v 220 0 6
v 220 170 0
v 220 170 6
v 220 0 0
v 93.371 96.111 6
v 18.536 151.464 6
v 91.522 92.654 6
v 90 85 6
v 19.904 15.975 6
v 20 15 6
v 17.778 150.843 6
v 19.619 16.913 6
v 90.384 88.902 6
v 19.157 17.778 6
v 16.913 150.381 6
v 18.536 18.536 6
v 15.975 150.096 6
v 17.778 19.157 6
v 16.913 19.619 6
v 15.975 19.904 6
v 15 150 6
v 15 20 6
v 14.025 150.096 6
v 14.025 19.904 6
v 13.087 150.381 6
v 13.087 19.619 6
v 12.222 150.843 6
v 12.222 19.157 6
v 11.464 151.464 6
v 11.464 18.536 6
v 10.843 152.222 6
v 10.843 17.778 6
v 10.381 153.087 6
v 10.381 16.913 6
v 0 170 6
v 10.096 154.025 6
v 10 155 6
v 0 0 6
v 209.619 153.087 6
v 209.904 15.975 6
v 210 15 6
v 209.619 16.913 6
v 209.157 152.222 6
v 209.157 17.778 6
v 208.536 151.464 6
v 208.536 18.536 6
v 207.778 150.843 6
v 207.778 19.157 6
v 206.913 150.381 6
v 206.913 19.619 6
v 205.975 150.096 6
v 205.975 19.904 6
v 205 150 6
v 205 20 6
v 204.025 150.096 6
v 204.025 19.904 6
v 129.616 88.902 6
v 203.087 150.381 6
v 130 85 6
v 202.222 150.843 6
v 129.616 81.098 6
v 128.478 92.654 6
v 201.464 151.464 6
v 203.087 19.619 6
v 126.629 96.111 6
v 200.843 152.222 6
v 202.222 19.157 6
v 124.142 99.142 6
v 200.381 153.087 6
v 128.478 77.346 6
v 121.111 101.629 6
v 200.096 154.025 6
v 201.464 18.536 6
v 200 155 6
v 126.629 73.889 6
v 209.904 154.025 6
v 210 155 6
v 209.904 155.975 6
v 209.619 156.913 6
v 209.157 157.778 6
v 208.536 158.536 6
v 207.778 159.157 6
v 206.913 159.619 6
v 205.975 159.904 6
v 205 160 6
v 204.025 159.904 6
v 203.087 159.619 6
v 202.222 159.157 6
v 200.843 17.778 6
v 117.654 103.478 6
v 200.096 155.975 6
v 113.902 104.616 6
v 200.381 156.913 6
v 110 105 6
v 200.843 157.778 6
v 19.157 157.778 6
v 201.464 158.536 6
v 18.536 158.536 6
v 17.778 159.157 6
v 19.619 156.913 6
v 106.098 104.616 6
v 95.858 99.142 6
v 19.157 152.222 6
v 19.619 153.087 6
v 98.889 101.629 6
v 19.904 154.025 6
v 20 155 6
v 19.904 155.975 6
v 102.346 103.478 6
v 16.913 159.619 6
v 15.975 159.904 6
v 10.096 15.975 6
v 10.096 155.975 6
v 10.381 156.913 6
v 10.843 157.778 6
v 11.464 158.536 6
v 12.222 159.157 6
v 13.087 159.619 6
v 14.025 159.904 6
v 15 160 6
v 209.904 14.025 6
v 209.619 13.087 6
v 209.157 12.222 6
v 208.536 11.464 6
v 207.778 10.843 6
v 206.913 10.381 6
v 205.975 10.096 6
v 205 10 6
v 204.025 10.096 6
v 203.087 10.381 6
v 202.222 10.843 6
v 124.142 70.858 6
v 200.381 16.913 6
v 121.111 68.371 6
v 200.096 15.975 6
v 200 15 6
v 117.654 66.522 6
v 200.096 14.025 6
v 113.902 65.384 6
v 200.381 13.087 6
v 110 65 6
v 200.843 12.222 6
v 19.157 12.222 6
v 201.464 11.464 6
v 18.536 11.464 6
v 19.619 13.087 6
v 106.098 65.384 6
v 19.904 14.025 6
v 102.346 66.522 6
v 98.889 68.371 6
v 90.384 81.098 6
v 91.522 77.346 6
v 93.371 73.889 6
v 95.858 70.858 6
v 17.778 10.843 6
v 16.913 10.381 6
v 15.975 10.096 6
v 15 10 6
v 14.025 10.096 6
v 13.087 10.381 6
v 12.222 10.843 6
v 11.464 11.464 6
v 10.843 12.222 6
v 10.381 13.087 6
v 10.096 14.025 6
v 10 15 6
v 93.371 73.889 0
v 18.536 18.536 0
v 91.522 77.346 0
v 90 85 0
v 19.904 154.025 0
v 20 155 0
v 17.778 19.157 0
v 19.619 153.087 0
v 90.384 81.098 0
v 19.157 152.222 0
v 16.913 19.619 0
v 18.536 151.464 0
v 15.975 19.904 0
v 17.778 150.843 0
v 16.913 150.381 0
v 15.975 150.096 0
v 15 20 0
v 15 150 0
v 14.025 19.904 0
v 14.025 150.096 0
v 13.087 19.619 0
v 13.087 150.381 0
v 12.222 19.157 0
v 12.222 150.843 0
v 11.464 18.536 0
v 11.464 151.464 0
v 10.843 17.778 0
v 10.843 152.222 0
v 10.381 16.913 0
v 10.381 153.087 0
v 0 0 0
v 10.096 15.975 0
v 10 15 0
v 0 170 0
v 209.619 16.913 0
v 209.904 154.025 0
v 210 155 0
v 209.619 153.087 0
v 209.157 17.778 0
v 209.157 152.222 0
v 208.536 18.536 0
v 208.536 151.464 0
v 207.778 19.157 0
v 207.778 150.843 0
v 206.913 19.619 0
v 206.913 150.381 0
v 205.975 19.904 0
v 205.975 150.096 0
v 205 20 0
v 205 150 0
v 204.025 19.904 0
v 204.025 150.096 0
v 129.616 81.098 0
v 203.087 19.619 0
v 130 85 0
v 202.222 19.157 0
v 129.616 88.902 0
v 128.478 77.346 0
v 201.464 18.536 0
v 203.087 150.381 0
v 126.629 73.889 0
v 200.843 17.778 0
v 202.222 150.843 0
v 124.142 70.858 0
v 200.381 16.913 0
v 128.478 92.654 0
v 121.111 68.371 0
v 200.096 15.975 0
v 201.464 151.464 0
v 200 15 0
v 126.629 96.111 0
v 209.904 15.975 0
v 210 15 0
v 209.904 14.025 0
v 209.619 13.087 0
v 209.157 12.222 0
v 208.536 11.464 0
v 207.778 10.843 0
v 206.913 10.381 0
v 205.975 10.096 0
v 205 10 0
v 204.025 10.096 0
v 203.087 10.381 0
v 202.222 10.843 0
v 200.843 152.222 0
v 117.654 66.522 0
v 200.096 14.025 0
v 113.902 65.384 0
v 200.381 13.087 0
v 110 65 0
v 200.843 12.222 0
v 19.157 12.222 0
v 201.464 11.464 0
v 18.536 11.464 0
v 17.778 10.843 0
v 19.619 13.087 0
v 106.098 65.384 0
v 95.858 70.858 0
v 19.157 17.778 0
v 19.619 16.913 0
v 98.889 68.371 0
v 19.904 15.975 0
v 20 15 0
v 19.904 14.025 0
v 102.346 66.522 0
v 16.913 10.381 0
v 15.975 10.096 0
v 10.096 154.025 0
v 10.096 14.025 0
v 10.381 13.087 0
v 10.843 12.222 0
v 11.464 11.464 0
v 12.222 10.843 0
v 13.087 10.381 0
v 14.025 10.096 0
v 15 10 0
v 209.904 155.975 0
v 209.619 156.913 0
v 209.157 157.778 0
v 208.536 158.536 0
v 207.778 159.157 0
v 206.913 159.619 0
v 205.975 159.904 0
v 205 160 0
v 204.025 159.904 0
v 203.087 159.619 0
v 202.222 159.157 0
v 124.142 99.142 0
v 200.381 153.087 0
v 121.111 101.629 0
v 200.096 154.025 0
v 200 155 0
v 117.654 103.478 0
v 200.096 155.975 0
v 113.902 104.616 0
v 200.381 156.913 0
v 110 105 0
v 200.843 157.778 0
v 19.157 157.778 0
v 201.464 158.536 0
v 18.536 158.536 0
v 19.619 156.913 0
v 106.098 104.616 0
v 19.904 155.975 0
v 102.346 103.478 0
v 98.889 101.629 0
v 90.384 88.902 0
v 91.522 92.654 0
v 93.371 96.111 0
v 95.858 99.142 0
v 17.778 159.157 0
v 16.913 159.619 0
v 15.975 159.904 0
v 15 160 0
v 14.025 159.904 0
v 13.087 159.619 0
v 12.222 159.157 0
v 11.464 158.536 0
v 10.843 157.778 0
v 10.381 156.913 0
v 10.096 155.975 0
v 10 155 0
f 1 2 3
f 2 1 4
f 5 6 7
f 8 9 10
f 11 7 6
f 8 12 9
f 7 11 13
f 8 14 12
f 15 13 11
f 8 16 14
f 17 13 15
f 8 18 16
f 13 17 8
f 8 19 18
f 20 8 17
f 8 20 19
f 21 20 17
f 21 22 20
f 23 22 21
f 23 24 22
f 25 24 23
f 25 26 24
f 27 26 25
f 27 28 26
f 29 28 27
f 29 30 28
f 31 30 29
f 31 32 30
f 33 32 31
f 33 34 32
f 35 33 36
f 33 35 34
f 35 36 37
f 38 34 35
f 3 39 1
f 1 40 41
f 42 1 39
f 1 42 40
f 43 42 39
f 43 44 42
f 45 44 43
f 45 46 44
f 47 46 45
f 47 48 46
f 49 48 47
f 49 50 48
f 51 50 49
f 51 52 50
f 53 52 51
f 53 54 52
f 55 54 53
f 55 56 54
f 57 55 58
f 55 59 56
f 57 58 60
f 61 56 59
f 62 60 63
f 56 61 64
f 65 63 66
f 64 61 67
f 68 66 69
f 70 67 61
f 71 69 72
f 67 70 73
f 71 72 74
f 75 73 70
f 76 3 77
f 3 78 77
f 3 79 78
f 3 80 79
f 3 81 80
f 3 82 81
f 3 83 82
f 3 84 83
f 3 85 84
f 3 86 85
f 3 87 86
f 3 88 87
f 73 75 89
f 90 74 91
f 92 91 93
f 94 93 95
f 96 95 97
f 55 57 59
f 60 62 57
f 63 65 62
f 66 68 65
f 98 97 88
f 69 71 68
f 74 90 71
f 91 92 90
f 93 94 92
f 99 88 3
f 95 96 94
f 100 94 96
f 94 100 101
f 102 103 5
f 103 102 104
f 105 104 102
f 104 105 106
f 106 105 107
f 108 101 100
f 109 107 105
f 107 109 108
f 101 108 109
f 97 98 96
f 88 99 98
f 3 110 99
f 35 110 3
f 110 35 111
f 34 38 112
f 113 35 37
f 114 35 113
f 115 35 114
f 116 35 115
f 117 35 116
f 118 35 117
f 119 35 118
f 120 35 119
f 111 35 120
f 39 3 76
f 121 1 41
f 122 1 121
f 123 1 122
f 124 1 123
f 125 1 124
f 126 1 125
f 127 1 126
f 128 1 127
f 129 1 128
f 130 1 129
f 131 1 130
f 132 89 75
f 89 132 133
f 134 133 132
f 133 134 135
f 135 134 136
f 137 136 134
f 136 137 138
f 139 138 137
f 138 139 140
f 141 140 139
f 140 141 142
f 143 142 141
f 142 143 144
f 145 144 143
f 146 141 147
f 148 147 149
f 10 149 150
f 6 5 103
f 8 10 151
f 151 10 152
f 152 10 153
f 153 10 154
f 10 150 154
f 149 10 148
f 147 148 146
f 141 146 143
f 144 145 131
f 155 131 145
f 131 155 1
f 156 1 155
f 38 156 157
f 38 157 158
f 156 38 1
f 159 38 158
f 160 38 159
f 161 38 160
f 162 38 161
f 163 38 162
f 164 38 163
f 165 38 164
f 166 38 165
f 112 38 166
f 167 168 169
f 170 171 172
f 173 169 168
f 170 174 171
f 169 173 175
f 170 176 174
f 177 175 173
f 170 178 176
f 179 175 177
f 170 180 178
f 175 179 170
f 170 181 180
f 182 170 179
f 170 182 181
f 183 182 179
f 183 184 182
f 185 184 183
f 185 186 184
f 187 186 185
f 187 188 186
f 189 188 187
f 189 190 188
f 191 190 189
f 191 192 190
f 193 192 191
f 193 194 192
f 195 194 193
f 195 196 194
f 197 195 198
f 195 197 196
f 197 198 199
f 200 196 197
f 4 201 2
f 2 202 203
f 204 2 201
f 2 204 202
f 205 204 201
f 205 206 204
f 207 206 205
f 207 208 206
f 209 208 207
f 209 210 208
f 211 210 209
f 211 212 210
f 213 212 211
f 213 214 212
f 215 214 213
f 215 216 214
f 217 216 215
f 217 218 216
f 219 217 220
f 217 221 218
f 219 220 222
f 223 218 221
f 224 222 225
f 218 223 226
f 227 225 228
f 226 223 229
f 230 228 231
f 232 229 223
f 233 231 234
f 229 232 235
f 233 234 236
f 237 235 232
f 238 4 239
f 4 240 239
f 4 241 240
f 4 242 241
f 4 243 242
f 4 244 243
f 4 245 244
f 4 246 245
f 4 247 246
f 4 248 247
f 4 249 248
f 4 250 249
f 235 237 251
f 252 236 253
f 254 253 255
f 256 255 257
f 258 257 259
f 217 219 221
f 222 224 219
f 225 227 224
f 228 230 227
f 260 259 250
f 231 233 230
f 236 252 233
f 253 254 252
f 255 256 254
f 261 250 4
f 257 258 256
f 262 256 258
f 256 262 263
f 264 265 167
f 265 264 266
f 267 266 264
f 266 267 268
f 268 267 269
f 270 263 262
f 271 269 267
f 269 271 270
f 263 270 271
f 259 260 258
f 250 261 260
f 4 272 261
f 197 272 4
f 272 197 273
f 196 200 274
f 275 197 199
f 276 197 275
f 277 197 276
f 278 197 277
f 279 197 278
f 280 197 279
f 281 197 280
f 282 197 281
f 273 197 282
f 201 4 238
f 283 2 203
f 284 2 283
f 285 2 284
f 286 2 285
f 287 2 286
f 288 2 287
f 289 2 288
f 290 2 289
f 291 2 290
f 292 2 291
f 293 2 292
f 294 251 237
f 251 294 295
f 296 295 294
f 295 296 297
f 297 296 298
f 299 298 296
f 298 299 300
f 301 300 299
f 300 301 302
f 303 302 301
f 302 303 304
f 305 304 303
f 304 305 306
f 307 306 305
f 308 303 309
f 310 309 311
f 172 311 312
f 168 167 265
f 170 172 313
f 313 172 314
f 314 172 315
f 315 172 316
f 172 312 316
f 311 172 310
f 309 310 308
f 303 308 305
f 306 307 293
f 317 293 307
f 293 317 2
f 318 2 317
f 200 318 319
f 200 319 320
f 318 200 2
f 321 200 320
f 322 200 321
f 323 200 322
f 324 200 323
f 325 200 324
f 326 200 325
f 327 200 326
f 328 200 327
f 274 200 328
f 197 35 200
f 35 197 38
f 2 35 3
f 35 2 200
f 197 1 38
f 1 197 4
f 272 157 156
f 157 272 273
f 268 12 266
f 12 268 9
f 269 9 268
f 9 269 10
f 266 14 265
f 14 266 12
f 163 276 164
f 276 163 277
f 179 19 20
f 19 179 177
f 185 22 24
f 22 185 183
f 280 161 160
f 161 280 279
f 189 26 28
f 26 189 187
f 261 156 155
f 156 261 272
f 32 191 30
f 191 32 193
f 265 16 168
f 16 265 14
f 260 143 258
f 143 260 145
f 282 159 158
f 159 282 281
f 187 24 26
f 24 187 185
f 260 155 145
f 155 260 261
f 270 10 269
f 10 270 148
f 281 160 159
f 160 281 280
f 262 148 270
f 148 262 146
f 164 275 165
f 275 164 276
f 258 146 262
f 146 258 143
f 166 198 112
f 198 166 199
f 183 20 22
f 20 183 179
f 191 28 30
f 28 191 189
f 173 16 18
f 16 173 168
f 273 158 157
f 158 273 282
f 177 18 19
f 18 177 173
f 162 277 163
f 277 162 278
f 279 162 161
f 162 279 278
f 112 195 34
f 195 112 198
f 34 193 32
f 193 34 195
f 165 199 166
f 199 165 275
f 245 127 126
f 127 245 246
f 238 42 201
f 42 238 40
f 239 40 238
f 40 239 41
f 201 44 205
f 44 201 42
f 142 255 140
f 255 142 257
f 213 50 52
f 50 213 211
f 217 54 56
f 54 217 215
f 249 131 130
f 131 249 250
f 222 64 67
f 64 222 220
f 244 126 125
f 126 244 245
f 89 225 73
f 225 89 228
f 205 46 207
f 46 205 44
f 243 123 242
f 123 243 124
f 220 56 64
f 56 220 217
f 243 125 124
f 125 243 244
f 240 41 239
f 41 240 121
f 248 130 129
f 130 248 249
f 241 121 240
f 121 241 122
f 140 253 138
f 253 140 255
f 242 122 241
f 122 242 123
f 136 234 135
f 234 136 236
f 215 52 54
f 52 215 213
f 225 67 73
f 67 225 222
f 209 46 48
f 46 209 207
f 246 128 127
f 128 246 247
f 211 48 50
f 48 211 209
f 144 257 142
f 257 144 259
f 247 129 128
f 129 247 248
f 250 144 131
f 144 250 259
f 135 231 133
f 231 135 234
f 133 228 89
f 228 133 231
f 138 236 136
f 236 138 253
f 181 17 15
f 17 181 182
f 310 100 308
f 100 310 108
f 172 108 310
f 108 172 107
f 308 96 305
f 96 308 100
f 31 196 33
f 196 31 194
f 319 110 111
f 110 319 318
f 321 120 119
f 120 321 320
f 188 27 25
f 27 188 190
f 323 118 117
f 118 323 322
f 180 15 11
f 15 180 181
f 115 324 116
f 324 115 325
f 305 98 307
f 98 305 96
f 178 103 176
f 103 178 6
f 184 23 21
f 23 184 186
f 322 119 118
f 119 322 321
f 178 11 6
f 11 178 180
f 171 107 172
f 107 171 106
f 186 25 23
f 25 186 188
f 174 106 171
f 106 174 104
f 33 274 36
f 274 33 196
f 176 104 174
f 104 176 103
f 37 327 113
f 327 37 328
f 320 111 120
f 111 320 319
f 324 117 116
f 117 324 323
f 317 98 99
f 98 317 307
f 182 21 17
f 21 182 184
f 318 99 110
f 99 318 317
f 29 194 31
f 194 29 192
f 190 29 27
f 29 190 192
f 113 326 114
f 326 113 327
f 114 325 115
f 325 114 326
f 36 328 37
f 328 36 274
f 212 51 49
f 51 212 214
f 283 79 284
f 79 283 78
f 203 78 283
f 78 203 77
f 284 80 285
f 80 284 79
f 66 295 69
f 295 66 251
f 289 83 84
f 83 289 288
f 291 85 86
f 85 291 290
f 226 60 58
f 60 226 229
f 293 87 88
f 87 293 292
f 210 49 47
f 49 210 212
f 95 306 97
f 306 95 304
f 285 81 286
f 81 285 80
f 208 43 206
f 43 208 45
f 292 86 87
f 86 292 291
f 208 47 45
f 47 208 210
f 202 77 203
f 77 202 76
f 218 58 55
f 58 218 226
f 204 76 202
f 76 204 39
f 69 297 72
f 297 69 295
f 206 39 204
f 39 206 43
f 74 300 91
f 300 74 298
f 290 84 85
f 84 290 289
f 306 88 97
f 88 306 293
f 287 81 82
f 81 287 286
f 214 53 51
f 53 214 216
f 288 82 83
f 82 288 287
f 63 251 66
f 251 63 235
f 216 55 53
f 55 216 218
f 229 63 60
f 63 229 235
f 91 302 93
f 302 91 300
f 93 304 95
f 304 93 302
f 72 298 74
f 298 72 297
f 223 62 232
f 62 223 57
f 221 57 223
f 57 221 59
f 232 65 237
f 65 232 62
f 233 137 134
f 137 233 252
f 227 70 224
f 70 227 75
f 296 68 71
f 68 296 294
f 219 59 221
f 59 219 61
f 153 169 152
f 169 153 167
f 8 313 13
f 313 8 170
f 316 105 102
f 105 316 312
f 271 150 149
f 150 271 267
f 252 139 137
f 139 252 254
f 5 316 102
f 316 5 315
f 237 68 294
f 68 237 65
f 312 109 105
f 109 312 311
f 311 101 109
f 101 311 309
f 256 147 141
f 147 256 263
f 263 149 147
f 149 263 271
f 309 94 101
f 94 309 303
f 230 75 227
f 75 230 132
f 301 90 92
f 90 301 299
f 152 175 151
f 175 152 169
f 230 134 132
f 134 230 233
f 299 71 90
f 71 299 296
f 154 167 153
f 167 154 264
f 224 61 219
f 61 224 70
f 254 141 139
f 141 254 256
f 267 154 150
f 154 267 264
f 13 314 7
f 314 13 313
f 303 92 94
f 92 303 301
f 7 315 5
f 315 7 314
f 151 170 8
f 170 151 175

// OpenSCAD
$fn = 32;

// ----------------------------------------------------------------------
// Big plate: 200-250 mm adapter plate
// ----------------------------------------------------------------------

// --- parameters (mm) ---
plate_l = 220;            // plate length, X
plate_w = 170;            // plate width, Y
plate_t = 6;              // plate thickness, Z
corner_d = 10;            // corner hole diameter
corner_in = 15;           // corner hole inset from the edges
bore_d = 40;              // central bore
fit_tol = 0.1;            // tolerance for press fits, mm
free_tol = 0.3;           // tolerance for clearance fits, mm

difference() {
  cube([plate_l, plate_w, plate_t]);
  translate([corner_in, corner_in, -1]) cylinder(h = plate_t + 2, d = corner_d);
  translate([plate_l - corner_in, corner_in, -1]) cylinder(h = plate_t + 2, d = corner_d);
  translate([corner_in, plate_w - corner_in, -1]) cylinder(h = plate_t + 2, d = corner_d);
  translate([plate_l - corner_in, plate_w - corner_in, -1]) cylinder(h = plate_t + 2, d = corner_d);
  translate([plate_l / 2, plate_w / 2, -1]) cylinder(h = plate_t + 2, d = bore_d);
}
